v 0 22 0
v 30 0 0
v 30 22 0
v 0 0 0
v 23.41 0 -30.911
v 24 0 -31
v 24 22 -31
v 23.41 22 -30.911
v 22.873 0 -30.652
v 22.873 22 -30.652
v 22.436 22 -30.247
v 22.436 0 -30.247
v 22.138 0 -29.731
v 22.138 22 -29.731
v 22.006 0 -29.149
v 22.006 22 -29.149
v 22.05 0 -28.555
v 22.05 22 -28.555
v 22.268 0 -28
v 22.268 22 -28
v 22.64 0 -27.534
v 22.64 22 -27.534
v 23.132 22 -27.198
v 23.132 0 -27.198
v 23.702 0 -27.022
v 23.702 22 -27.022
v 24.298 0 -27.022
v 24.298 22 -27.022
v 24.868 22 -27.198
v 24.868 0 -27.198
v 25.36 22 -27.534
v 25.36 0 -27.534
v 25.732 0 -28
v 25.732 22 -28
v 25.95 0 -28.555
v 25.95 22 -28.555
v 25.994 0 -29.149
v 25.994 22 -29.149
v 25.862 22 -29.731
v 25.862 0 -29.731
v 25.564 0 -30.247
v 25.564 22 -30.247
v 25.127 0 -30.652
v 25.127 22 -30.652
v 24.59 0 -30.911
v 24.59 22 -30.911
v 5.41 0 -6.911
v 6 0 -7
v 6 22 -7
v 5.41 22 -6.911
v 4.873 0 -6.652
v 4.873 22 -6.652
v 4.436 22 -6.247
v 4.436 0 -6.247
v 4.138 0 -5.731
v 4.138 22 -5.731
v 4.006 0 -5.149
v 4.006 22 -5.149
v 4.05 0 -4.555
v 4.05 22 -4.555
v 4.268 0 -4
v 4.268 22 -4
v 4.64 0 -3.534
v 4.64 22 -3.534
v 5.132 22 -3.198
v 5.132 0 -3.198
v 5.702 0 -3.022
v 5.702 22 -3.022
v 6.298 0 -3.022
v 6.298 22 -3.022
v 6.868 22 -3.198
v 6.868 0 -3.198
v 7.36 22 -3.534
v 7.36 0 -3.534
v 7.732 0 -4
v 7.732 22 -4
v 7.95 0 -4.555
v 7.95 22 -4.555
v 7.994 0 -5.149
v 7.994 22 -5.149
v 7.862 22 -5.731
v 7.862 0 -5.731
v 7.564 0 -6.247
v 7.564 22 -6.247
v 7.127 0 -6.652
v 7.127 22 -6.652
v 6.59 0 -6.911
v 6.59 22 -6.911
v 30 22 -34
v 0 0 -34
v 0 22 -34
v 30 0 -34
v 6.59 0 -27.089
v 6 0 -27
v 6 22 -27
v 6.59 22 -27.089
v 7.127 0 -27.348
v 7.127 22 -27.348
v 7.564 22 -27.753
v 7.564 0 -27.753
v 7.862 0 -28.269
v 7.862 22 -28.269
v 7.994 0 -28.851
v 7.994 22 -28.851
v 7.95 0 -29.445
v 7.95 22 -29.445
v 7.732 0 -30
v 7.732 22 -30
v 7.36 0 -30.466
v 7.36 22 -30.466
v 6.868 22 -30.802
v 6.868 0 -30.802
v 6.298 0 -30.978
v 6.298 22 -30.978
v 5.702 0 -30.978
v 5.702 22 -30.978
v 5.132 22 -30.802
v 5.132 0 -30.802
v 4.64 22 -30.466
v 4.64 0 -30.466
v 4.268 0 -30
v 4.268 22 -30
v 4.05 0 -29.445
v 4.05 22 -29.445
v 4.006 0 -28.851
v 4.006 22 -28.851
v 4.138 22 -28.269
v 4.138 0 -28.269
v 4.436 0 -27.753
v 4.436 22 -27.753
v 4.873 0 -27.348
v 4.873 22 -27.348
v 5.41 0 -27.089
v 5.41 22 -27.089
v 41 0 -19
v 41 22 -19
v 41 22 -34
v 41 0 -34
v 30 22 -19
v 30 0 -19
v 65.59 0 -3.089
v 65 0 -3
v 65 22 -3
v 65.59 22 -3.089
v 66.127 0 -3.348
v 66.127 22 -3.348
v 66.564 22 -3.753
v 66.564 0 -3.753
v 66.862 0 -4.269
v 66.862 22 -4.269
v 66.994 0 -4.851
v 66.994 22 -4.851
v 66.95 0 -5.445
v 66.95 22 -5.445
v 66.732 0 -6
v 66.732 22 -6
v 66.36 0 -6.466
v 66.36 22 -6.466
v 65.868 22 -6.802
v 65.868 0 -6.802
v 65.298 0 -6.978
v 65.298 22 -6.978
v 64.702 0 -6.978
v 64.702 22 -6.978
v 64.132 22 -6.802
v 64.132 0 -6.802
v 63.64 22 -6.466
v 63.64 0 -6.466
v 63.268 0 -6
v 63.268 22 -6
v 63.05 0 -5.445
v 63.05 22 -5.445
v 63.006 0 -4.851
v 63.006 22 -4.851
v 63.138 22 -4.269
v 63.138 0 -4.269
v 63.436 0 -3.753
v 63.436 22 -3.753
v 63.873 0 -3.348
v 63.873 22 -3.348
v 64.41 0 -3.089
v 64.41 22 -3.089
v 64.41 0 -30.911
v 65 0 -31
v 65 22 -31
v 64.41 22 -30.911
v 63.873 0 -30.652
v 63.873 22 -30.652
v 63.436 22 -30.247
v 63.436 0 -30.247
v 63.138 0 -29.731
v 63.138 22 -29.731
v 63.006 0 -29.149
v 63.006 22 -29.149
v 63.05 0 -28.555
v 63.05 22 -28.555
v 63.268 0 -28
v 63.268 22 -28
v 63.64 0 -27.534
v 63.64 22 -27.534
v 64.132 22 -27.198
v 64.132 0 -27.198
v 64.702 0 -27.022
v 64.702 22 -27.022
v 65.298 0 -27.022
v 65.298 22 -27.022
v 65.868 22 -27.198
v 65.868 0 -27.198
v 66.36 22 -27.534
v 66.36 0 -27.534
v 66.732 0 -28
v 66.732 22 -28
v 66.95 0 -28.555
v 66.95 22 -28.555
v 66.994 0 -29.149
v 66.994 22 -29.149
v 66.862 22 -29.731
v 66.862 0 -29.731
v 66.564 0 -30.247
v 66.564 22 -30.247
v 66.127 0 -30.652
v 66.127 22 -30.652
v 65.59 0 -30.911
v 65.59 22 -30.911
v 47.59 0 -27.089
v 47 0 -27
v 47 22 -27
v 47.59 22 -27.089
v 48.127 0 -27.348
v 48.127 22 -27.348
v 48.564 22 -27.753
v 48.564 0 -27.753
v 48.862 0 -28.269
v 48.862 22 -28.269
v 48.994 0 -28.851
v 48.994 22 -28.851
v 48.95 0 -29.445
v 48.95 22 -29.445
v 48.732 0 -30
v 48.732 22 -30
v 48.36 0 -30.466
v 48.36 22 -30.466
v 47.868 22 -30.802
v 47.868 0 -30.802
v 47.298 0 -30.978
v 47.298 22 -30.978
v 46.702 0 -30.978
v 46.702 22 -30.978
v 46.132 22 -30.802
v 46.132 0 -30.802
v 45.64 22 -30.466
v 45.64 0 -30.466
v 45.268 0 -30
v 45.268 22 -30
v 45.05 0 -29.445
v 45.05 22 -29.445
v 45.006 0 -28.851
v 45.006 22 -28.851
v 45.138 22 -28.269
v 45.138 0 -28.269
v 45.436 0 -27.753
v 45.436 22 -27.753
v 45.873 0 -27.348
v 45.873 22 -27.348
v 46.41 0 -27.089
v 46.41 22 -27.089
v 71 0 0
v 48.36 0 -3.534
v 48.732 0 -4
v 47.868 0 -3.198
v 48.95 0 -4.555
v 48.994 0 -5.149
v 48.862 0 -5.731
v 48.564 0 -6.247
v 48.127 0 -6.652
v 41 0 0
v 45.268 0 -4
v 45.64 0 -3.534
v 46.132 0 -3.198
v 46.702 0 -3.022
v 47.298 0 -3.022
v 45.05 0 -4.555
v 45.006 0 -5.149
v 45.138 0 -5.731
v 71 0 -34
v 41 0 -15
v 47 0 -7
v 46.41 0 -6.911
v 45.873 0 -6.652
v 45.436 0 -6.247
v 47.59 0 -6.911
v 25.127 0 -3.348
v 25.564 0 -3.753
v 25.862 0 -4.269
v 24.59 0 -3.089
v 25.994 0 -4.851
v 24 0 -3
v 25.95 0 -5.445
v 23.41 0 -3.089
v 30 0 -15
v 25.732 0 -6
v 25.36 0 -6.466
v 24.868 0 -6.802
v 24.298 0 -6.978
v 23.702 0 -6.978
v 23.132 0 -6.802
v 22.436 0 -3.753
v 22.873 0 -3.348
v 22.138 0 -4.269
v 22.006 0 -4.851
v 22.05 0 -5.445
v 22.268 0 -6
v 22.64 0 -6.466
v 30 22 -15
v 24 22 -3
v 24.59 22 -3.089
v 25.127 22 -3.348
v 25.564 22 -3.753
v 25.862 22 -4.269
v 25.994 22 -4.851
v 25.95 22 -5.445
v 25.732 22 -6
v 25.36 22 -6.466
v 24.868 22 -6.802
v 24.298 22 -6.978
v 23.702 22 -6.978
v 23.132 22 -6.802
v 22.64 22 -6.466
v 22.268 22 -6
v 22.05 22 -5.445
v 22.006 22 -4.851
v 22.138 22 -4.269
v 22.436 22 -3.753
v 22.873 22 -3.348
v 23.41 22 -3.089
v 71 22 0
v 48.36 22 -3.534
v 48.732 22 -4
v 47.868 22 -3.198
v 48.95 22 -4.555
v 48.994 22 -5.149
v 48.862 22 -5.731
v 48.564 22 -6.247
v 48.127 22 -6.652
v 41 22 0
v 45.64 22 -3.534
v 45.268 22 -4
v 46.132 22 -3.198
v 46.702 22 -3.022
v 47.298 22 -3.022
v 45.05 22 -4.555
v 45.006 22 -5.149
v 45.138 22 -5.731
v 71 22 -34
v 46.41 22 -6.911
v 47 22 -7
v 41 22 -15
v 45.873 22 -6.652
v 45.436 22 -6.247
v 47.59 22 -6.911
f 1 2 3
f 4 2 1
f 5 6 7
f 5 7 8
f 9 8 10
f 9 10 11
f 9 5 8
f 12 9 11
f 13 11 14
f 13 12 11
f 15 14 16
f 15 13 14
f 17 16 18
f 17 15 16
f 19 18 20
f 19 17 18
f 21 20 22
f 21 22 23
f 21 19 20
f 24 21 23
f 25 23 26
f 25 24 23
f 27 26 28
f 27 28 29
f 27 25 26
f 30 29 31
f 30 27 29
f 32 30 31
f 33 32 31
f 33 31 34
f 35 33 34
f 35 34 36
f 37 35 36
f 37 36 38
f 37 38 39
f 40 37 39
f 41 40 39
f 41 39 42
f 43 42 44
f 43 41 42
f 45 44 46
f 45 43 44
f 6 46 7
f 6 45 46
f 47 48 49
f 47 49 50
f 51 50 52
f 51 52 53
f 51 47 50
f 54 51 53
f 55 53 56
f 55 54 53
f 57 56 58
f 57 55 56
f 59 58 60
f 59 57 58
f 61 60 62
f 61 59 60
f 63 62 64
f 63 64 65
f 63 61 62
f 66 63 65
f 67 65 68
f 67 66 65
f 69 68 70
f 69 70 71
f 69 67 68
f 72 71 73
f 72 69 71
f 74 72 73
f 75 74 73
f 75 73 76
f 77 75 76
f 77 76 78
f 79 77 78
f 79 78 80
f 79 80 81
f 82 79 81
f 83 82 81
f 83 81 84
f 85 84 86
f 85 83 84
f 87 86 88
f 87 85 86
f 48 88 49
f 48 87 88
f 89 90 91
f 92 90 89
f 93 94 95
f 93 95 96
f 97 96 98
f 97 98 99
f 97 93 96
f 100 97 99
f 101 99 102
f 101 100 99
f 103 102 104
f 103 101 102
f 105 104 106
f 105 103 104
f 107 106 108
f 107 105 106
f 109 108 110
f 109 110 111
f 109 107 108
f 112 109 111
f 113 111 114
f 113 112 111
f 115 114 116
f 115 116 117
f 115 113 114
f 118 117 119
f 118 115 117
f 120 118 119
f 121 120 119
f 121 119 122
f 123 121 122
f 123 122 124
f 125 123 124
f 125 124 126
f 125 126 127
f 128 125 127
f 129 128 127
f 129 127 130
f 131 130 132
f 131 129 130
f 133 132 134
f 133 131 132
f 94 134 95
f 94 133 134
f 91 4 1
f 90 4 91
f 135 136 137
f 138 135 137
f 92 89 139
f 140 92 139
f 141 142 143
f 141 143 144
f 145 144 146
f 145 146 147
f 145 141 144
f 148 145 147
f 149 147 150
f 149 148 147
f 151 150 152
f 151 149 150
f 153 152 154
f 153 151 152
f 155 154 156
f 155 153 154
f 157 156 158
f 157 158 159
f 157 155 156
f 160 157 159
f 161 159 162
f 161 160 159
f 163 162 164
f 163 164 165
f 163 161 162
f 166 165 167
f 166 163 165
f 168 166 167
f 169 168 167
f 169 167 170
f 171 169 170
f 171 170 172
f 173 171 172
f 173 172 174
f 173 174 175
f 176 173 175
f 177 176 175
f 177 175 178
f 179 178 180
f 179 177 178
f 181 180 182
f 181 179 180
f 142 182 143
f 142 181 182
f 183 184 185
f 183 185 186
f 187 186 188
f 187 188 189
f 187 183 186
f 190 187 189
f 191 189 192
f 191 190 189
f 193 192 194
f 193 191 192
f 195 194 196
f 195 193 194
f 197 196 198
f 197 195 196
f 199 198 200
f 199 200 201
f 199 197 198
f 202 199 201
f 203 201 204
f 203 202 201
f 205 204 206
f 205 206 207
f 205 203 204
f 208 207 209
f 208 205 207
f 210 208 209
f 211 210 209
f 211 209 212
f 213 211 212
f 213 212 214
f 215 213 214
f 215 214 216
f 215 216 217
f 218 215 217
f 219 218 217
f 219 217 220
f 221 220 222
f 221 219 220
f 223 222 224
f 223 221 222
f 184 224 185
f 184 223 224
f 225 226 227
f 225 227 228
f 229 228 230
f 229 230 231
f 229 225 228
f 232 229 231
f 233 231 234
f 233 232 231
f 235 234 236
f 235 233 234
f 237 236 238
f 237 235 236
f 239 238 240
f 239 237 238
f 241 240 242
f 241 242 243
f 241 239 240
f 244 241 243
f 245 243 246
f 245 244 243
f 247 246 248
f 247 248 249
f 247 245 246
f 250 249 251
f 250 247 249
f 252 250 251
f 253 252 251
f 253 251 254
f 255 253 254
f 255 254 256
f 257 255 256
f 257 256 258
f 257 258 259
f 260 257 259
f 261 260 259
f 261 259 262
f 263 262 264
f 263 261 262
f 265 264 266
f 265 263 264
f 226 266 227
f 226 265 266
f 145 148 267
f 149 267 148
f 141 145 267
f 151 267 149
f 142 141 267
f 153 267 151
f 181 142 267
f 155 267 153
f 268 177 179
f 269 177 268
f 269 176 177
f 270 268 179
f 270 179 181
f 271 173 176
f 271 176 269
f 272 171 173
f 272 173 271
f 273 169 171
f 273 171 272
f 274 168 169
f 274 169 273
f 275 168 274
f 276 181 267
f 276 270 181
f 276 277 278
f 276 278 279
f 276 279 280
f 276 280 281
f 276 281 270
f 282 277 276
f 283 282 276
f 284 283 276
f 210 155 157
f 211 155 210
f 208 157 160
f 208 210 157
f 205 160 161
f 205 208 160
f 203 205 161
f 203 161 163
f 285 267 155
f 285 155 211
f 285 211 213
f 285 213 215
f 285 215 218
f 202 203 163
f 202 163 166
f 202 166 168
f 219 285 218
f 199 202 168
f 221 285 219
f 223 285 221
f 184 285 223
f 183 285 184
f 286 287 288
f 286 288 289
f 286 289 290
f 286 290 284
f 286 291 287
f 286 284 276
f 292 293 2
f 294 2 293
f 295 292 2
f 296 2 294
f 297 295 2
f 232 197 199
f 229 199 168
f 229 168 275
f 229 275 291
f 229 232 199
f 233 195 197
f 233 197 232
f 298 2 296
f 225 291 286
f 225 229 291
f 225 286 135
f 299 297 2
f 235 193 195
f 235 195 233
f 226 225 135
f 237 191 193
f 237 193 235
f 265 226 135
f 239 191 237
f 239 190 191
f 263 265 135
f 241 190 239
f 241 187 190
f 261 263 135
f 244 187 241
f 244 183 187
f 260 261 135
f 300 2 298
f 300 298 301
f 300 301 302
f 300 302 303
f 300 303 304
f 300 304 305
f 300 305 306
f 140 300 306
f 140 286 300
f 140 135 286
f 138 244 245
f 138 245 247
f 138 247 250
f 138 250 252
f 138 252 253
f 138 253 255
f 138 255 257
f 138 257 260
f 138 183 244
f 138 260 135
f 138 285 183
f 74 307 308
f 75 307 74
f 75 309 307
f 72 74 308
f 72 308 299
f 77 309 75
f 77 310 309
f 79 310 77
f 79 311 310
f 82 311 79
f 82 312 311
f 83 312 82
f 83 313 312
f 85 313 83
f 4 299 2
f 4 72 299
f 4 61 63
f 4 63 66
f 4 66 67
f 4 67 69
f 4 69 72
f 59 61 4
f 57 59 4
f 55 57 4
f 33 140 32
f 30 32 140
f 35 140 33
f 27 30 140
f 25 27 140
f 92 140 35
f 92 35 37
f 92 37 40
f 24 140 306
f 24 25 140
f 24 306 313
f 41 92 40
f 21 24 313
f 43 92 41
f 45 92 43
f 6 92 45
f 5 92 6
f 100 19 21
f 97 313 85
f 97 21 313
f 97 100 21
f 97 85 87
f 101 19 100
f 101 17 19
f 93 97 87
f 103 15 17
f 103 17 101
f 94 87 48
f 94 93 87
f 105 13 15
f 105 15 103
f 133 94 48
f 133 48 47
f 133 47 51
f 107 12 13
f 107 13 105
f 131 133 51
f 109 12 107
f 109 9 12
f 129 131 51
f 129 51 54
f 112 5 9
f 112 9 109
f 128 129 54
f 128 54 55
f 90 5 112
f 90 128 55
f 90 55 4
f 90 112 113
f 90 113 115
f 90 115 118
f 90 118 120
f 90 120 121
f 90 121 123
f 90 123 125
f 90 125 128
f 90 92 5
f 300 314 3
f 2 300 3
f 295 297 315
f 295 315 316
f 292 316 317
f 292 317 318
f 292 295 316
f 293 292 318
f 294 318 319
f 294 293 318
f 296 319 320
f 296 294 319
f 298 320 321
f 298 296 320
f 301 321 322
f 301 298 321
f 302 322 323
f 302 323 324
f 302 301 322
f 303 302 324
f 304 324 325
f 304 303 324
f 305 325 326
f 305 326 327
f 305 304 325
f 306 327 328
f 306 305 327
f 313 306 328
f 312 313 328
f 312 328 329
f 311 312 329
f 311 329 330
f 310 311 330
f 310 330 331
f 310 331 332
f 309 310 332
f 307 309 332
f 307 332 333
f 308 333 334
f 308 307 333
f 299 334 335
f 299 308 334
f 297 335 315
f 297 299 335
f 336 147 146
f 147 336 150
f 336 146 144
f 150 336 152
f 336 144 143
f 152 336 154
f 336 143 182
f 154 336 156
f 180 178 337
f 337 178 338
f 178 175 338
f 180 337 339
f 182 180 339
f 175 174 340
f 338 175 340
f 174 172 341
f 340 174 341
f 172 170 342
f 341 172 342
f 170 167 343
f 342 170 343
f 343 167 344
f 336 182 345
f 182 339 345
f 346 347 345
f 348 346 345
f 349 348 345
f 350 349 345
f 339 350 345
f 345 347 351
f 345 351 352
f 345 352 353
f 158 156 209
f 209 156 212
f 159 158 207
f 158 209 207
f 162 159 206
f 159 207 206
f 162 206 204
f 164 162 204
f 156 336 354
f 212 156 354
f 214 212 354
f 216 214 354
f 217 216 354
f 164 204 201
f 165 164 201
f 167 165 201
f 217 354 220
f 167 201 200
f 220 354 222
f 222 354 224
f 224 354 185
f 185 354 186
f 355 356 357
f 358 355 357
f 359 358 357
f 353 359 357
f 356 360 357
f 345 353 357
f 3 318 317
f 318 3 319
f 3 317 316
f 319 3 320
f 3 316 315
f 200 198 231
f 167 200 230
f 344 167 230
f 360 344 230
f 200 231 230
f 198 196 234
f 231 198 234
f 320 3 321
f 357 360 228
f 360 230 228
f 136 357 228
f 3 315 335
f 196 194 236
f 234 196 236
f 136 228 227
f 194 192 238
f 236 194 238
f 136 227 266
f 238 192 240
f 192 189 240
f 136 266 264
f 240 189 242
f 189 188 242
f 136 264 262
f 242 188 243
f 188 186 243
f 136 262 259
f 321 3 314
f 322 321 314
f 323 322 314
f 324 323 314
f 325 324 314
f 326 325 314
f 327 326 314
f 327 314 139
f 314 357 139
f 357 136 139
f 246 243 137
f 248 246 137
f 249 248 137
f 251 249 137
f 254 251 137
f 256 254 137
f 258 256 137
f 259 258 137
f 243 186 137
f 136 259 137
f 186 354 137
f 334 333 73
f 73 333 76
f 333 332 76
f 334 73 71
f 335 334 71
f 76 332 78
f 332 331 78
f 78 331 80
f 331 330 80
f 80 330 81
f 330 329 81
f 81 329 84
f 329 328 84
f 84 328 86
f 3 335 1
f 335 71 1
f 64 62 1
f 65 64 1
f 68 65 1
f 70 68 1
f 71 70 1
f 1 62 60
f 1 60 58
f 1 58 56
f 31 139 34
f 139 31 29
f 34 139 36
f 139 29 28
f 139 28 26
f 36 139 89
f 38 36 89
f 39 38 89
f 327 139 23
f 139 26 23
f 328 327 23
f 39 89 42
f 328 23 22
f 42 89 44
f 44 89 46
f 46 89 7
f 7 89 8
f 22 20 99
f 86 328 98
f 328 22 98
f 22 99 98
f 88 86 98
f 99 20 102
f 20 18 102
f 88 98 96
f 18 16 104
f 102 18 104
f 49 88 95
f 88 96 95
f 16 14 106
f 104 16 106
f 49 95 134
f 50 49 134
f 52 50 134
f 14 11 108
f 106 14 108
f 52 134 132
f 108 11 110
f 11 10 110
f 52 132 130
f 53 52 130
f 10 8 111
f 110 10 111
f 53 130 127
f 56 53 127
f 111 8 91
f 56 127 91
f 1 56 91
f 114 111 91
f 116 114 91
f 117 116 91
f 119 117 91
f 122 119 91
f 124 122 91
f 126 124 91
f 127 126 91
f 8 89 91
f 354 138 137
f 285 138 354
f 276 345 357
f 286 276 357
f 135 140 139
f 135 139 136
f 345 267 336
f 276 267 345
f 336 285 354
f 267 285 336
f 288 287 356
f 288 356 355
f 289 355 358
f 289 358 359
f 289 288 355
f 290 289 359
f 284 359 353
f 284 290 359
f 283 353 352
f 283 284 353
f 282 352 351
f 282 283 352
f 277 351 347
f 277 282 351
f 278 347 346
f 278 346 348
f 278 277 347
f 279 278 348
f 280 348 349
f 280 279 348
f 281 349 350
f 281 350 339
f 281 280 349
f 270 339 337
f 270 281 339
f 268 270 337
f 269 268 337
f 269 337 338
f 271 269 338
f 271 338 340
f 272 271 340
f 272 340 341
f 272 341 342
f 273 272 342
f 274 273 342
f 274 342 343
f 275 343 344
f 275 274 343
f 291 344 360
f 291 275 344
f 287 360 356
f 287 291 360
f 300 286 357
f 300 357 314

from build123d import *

# Parameters (mm, degrees)
SKETCH_1_R      = 2
EXTRUDE_1_DEPTH = 22


with BuildPart() as part:
    # 草图1 → 凸台-拉伸1 (new body)
    with BuildSketch(Plane(origin=(0, 0, 0), x_dir=(1, 0, 0), z_dir=(0, 1, 0))):
        Polygon((0, 0), (0, 34), (30, 34), (30, 19), (41, 19), (41, 34), (71, 34), (71, 0), (41, 0), (41, 15), (30, 15), (30, 0), align=None)
        with Locations(Location((6, 29, 0), (0, 0, 270))):
            Circle(SKETCH_1_R, mode=Mode.SUBTRACT)
        with Locations(Location((24, 29, 0), (0, 0, 90))):
            Circle(SKETCH_1_R, mode=Mode.SUBTRACT)
        with Locations(Location((24, 5, 0), (0, 0, 270))):
            Circle(SKETCH_1_R, mode=Mode.SUBTRACT)
        with Locations(Location((6, 5, 0), (0, 0, 90))):
            Circle(SKETCH_1_R, mode=Mode.SUBTRACT)
        with Locations(Location((47, 29, 0), (0, 0, 270))):
            Circle(SKETCH_1_R, mode=Mode.SUBTRACT)
        with Locations(Location((47, 5, 0), (0, 0, 90))):
            Circle(SKETCH_1_R, mode=Mode.SUBTRACT)
        with Locations(Location((65, 5, 0), (0, 0, 270))):
            Circle(SKETCH_1_R, mode=Mode.SUBTRACT)
        with Locations(Location((65, 29, 0), (0, 0, 90))):
            Circle(SKETCH_1_R, mode=Mode.SUBTRACT)
    extrude(amount=EXTRUDE_1_DEPTH)


solid = part.part
